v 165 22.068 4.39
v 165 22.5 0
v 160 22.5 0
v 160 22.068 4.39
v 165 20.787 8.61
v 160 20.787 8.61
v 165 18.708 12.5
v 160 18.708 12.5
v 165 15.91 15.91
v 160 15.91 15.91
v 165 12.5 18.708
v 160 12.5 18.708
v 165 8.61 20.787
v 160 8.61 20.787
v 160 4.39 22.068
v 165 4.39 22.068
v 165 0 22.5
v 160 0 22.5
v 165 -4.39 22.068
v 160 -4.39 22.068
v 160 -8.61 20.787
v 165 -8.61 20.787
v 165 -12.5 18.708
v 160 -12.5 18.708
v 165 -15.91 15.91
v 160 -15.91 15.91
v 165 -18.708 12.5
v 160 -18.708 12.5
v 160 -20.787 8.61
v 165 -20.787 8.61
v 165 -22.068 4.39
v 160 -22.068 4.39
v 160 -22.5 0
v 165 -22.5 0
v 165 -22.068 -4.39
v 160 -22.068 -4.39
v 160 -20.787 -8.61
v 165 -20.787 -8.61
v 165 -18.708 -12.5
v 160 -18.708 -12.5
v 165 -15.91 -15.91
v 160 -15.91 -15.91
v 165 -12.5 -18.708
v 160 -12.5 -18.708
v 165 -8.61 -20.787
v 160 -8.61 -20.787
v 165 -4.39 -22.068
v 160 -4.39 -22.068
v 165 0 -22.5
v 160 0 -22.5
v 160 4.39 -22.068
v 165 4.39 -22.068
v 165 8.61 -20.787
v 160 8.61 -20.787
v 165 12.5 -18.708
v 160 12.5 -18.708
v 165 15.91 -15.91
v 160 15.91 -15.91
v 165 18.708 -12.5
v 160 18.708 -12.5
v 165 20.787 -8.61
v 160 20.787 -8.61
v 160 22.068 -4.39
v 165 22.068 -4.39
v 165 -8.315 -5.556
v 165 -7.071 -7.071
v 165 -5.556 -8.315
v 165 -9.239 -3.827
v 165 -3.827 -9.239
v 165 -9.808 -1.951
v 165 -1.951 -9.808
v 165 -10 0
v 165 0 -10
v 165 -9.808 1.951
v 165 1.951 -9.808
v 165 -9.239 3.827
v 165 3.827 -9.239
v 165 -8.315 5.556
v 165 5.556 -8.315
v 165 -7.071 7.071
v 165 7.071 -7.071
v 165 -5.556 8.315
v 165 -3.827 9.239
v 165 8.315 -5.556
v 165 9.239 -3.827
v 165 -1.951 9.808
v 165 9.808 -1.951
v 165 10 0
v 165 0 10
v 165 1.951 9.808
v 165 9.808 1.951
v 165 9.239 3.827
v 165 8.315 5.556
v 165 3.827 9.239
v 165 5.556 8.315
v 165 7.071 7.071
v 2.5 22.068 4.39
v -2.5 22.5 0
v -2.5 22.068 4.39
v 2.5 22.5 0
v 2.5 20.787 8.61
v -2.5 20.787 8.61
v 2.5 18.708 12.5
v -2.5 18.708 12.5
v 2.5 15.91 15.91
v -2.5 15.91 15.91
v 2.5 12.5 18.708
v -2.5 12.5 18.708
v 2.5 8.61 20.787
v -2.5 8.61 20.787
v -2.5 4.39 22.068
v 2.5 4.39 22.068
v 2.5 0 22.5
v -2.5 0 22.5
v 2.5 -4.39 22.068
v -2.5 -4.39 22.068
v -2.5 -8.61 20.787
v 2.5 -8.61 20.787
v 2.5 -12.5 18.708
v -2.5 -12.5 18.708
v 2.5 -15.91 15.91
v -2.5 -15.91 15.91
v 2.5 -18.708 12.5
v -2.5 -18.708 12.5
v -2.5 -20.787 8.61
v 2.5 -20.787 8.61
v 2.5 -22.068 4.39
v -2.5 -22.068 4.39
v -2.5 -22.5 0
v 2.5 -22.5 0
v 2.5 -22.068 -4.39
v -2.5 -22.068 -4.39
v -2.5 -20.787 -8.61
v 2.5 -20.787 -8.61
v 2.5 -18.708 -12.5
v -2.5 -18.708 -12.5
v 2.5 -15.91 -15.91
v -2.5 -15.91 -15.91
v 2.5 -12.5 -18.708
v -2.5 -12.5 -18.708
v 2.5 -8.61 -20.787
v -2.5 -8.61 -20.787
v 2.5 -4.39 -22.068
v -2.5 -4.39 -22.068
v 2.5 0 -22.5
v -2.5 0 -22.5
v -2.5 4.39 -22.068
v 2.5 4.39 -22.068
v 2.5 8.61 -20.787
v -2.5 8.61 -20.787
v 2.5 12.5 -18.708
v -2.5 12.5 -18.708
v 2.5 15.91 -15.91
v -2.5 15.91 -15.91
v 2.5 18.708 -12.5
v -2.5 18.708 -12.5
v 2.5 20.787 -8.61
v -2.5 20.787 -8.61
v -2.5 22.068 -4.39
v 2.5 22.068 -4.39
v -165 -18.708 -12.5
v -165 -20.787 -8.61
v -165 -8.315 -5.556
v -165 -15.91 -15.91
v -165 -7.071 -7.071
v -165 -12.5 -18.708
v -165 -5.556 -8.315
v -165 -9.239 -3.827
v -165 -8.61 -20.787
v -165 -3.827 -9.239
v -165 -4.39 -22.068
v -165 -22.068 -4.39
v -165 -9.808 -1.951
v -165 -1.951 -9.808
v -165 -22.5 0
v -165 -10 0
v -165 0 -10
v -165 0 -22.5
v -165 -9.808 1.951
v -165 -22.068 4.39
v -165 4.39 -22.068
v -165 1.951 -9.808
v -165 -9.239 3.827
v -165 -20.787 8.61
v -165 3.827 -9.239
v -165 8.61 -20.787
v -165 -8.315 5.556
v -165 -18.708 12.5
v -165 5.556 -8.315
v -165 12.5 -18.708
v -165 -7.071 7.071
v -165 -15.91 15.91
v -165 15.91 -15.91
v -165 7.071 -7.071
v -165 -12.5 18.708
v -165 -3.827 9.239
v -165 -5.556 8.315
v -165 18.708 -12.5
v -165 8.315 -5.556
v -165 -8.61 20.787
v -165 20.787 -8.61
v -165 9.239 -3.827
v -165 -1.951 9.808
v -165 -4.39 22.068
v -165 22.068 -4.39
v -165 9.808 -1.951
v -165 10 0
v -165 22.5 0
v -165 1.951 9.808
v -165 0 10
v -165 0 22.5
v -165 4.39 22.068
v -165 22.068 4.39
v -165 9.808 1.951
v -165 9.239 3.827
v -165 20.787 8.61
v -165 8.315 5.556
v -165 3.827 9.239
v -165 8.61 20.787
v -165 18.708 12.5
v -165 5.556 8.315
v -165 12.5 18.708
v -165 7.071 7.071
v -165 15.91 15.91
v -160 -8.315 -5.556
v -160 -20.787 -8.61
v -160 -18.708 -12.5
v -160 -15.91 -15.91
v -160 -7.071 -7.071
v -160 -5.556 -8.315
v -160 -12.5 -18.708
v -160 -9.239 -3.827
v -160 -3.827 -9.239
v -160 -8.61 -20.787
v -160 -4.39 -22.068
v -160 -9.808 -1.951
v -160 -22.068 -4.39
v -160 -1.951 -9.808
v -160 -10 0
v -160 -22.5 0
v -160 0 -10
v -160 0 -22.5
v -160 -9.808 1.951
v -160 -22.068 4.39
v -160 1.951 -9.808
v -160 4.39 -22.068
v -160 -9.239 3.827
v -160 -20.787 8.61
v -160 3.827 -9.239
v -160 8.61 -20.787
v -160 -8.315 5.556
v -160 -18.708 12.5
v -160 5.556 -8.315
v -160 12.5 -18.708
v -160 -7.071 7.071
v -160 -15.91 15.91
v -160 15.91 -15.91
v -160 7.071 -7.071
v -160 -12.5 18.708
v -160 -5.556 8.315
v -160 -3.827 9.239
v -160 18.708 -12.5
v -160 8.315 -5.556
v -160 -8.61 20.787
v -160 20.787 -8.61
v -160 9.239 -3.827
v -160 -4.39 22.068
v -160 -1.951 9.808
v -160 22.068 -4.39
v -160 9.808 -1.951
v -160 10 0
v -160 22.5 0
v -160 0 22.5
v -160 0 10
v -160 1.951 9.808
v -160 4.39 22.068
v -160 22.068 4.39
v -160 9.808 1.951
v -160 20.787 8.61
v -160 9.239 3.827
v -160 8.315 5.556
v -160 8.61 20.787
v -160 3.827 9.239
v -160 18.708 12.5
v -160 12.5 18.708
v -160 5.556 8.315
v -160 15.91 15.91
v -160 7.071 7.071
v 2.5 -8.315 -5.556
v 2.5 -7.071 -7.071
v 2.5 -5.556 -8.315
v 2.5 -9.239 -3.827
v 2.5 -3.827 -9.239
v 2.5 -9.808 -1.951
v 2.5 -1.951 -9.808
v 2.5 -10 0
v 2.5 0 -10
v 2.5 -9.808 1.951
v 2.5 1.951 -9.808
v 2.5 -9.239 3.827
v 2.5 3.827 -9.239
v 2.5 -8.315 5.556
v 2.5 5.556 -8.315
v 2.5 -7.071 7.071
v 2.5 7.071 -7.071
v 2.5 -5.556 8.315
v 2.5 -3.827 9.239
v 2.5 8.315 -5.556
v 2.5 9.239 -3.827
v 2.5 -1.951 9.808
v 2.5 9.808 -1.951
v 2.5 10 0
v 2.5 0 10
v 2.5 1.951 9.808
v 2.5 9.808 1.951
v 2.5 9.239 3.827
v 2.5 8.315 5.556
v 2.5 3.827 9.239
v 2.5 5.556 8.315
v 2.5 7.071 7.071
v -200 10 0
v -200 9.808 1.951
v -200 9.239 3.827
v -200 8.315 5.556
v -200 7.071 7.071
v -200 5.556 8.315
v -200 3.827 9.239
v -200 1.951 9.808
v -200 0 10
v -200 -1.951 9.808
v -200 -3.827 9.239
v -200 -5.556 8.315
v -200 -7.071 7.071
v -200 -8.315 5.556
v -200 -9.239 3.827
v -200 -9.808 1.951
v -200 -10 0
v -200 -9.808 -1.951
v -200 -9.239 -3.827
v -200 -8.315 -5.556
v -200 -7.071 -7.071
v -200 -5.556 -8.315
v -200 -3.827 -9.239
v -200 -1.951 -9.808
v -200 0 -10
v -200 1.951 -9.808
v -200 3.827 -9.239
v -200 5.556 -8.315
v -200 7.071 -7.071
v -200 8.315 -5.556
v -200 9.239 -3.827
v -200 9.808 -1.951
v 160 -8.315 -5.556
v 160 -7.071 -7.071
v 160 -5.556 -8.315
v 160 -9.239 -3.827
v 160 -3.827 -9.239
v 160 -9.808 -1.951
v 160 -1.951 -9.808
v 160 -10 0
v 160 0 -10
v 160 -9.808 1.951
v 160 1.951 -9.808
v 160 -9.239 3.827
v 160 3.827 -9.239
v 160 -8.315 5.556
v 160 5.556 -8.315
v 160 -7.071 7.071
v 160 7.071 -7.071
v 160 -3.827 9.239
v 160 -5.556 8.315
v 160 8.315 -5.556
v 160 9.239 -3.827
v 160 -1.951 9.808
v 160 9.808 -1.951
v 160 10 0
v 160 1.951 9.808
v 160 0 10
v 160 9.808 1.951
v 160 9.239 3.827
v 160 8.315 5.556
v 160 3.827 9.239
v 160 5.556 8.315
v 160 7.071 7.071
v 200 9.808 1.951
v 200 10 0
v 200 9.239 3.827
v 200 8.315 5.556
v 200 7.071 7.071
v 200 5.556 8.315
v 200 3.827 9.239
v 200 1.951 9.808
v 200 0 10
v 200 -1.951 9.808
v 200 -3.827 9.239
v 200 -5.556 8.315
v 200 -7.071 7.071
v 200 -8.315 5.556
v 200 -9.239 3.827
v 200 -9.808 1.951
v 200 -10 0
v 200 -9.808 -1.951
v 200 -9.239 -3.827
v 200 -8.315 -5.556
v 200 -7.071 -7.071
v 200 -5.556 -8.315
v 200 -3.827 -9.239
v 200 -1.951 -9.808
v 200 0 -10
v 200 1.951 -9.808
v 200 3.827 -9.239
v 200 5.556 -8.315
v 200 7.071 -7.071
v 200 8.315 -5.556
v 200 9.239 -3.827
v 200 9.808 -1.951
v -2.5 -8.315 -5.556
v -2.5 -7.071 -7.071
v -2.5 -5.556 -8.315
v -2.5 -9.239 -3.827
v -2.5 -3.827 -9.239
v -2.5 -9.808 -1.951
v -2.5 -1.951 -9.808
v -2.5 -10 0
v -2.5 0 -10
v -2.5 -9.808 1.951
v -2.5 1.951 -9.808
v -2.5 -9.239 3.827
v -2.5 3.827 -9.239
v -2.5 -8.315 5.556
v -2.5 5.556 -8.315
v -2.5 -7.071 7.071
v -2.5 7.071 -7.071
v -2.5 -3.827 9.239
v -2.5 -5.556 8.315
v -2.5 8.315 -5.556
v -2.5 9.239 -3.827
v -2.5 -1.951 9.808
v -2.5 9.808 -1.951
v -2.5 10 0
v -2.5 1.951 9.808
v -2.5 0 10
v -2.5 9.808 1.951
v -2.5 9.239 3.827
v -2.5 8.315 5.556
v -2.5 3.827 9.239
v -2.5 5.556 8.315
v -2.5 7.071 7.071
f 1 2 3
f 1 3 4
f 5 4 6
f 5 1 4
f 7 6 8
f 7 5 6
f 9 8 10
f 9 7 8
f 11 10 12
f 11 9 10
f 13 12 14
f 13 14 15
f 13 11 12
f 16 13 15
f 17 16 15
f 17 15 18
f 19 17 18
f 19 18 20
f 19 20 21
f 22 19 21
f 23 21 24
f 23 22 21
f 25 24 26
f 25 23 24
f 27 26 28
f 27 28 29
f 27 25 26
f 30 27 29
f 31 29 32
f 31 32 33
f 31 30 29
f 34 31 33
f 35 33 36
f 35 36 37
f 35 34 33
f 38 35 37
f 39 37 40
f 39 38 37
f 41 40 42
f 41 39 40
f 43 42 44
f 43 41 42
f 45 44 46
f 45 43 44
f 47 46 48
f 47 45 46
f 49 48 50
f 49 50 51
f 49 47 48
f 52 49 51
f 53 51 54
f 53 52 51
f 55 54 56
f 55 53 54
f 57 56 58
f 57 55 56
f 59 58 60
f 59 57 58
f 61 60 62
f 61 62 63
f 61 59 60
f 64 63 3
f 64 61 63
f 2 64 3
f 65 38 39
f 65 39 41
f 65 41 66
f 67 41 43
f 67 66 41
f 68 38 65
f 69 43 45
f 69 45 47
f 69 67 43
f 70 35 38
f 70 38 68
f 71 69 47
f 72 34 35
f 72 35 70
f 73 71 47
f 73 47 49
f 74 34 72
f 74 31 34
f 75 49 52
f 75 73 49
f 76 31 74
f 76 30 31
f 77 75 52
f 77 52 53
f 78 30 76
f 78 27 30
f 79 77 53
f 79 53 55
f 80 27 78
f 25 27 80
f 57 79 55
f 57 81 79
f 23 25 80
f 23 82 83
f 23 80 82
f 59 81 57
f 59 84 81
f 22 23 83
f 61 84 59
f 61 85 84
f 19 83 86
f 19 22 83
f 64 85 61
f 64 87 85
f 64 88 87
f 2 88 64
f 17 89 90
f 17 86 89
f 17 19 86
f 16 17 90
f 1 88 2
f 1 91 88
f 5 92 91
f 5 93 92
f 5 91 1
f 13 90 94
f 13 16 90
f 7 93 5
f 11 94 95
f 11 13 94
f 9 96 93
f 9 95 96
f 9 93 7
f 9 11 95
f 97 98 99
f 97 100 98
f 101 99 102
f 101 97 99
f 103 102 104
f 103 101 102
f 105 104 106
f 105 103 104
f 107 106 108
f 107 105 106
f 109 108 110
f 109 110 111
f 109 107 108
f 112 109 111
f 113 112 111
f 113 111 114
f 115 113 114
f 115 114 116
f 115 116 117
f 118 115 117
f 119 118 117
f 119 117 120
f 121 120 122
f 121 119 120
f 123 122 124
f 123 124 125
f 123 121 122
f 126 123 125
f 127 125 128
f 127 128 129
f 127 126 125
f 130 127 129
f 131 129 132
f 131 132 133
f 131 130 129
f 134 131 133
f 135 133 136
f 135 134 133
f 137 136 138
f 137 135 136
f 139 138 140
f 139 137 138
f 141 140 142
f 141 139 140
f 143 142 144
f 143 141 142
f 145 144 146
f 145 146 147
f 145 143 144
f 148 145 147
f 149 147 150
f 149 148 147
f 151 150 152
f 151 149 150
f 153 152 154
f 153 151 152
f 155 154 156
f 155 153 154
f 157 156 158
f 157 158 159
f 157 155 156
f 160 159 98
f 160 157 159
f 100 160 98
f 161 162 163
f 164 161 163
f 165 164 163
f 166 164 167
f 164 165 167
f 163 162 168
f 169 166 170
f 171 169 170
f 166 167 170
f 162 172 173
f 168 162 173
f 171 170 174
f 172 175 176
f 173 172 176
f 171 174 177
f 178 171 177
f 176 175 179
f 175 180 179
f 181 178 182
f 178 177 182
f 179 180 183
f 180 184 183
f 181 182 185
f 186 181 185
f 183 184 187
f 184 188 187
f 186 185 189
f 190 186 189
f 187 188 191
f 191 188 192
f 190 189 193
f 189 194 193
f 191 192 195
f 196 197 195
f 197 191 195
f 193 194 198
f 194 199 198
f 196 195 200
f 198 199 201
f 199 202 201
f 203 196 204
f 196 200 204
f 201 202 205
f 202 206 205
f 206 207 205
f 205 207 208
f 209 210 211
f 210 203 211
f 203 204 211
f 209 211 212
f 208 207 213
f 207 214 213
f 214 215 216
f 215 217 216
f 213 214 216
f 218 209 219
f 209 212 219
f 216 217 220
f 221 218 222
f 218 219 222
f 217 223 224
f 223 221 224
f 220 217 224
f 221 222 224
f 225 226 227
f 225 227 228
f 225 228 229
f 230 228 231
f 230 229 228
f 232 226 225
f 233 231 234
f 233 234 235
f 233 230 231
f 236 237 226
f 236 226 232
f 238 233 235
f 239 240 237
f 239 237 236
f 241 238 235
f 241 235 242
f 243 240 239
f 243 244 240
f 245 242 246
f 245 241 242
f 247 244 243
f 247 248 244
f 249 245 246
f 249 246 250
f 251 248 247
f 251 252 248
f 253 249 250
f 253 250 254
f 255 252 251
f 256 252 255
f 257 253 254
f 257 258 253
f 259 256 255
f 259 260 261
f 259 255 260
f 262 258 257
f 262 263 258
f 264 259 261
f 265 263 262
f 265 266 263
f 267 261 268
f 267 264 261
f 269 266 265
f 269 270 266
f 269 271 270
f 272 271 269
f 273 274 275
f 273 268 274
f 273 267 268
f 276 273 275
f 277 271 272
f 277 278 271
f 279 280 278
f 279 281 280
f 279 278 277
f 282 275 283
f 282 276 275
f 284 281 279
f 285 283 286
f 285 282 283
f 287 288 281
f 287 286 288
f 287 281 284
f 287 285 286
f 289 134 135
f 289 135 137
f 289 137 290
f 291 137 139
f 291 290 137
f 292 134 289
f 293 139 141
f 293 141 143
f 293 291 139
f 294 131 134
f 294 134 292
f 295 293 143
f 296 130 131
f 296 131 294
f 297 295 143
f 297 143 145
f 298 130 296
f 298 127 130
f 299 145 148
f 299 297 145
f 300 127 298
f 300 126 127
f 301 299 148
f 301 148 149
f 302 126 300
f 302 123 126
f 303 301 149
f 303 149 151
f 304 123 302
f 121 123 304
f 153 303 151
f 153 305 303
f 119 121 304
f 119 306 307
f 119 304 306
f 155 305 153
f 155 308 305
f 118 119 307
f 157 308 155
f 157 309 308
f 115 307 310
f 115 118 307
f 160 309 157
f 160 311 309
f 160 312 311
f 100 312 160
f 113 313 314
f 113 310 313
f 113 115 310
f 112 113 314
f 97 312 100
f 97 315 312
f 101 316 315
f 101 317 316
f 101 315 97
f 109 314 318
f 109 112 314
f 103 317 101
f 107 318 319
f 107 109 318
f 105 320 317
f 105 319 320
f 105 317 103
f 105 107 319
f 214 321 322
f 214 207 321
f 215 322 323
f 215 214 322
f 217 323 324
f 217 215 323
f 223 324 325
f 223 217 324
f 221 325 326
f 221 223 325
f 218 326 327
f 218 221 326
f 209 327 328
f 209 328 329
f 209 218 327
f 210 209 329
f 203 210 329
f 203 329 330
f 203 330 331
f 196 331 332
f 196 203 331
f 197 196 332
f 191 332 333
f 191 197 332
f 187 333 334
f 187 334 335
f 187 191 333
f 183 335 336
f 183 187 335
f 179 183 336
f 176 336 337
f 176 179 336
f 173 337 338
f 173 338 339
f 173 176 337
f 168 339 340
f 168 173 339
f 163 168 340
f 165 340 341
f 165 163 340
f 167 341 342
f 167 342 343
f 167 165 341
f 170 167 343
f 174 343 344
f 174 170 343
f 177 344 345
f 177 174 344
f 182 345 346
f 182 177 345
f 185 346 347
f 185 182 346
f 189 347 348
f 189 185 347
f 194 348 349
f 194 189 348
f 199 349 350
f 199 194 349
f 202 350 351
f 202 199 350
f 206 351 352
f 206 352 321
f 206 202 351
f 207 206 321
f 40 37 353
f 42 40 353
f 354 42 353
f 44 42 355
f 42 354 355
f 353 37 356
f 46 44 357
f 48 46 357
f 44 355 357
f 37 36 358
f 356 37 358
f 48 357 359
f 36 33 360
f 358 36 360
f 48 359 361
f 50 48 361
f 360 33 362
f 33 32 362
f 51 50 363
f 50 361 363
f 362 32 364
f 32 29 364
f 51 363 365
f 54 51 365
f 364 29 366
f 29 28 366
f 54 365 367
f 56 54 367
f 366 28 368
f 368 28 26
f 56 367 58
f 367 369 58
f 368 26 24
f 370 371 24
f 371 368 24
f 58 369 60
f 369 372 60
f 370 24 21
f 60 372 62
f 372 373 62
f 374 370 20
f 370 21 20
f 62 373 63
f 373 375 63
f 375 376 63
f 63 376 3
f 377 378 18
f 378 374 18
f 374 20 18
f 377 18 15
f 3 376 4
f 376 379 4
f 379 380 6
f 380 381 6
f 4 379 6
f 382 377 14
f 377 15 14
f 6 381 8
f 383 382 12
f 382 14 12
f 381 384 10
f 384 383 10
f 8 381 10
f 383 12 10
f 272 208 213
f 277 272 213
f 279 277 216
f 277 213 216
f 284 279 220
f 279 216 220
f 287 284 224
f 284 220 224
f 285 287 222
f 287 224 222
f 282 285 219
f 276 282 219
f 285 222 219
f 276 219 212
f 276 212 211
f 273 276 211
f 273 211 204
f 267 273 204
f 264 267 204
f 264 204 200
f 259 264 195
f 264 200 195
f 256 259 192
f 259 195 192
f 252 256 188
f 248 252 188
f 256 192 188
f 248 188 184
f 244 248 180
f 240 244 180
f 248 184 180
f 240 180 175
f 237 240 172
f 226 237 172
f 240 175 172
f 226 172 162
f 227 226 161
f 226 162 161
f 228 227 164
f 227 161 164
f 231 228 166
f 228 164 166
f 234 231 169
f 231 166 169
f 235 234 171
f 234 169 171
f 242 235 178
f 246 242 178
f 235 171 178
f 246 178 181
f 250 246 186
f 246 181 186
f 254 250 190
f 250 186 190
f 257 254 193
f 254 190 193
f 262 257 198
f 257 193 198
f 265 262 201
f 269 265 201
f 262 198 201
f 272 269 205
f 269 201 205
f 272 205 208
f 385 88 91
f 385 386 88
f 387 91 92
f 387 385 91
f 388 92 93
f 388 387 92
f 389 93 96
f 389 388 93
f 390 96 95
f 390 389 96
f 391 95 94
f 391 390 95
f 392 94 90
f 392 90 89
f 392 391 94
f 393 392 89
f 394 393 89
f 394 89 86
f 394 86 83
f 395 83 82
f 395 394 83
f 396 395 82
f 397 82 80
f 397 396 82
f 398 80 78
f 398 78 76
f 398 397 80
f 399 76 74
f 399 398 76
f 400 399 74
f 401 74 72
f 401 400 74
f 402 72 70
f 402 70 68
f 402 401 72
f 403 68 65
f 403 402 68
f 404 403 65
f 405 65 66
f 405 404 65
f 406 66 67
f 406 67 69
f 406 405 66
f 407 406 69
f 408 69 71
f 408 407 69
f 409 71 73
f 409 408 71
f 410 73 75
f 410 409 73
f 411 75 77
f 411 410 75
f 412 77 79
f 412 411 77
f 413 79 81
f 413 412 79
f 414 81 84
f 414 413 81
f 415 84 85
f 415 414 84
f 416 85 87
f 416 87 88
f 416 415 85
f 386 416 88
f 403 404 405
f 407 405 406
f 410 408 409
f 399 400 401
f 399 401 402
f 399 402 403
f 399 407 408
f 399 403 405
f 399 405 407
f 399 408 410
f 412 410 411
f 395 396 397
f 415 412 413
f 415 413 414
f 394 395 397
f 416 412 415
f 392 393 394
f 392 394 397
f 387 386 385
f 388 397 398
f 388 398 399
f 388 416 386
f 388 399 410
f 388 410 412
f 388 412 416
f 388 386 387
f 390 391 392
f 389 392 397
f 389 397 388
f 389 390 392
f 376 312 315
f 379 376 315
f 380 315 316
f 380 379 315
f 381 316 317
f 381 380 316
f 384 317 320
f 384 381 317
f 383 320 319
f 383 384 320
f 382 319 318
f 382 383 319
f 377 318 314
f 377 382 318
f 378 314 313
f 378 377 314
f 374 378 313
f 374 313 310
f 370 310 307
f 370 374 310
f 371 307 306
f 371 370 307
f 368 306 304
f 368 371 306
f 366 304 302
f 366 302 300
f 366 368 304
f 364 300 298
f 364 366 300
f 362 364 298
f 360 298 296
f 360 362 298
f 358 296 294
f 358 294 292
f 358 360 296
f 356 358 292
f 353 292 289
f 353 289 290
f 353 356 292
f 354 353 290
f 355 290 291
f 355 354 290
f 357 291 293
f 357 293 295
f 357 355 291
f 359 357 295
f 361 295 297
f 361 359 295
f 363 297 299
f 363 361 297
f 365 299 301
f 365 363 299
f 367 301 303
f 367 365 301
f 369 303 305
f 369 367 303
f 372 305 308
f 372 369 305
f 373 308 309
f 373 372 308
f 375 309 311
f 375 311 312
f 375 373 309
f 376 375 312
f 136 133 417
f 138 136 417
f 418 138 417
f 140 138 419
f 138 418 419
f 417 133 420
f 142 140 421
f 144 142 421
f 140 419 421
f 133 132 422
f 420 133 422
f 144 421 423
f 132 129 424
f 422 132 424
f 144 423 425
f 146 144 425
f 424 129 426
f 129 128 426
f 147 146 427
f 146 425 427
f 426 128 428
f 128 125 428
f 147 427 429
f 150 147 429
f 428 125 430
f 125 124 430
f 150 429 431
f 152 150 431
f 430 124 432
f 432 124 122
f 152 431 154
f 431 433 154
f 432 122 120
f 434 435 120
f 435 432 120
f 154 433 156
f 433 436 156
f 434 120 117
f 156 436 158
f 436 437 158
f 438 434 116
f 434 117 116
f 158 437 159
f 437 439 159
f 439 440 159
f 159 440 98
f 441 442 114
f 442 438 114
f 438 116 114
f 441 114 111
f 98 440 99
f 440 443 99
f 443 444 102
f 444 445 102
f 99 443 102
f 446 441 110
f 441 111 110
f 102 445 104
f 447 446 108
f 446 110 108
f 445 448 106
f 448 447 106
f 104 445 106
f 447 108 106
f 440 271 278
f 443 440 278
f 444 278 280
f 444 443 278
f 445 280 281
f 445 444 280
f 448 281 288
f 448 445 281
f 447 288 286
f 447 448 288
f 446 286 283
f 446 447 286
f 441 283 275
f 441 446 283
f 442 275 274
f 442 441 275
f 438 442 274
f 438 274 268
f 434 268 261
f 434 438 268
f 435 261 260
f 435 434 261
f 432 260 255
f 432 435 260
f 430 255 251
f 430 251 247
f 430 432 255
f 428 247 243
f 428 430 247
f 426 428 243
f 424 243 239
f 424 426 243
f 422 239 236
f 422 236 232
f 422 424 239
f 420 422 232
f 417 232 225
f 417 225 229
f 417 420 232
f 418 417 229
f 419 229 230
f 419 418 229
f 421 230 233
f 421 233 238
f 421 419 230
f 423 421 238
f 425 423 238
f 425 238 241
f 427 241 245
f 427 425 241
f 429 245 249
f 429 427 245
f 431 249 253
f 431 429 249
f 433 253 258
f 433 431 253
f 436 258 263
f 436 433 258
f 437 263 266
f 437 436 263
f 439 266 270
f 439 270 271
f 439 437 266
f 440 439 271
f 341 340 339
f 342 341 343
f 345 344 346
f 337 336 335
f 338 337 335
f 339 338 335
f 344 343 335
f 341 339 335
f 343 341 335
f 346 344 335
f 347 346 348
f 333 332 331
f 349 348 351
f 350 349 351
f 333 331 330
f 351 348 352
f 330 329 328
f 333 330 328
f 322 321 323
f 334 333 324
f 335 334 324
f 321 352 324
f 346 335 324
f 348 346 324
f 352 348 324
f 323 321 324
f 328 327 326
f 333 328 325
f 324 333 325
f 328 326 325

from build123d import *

# Parameters (mm, degrees)
F0_R     = 10
F1_DEPTH = 200
F4_R     = 22.5
F5_DEPTH = 5
F6_R     = 22.5
F7_DEPTH = 5
F8_R     = 22.5
F9_DEPTH = 2.5


with BuildPart() as f1:
    # F0 (on Right) → F1 (new body, symmetric)
    with BuildSketch(Plane.YZ):
        Circle(F0_R)
    extrude(amount=F1_DEPTH, both=True)

    # F4 (on offset) → F5 (join)
    with BuildSketch(Plane.YZ.offset(165)):
        Circle(F4_R)
    extrude(amount=-F5_DEPTH)

    # F6 (on offset) → F7 (join)
    with BuildSketch(Plane.YZ.offset(-165)):
        Circle(F6_R)
    extrude(amount=F7_DEPTH)

    # F8 (on Right) → F9 (join, symmetric)
    with BuildSketch(Plane.YZ):
        Circle(F8_R)
    extrude(amount=F9_DEPTH, both=True)


solid = f1.part
